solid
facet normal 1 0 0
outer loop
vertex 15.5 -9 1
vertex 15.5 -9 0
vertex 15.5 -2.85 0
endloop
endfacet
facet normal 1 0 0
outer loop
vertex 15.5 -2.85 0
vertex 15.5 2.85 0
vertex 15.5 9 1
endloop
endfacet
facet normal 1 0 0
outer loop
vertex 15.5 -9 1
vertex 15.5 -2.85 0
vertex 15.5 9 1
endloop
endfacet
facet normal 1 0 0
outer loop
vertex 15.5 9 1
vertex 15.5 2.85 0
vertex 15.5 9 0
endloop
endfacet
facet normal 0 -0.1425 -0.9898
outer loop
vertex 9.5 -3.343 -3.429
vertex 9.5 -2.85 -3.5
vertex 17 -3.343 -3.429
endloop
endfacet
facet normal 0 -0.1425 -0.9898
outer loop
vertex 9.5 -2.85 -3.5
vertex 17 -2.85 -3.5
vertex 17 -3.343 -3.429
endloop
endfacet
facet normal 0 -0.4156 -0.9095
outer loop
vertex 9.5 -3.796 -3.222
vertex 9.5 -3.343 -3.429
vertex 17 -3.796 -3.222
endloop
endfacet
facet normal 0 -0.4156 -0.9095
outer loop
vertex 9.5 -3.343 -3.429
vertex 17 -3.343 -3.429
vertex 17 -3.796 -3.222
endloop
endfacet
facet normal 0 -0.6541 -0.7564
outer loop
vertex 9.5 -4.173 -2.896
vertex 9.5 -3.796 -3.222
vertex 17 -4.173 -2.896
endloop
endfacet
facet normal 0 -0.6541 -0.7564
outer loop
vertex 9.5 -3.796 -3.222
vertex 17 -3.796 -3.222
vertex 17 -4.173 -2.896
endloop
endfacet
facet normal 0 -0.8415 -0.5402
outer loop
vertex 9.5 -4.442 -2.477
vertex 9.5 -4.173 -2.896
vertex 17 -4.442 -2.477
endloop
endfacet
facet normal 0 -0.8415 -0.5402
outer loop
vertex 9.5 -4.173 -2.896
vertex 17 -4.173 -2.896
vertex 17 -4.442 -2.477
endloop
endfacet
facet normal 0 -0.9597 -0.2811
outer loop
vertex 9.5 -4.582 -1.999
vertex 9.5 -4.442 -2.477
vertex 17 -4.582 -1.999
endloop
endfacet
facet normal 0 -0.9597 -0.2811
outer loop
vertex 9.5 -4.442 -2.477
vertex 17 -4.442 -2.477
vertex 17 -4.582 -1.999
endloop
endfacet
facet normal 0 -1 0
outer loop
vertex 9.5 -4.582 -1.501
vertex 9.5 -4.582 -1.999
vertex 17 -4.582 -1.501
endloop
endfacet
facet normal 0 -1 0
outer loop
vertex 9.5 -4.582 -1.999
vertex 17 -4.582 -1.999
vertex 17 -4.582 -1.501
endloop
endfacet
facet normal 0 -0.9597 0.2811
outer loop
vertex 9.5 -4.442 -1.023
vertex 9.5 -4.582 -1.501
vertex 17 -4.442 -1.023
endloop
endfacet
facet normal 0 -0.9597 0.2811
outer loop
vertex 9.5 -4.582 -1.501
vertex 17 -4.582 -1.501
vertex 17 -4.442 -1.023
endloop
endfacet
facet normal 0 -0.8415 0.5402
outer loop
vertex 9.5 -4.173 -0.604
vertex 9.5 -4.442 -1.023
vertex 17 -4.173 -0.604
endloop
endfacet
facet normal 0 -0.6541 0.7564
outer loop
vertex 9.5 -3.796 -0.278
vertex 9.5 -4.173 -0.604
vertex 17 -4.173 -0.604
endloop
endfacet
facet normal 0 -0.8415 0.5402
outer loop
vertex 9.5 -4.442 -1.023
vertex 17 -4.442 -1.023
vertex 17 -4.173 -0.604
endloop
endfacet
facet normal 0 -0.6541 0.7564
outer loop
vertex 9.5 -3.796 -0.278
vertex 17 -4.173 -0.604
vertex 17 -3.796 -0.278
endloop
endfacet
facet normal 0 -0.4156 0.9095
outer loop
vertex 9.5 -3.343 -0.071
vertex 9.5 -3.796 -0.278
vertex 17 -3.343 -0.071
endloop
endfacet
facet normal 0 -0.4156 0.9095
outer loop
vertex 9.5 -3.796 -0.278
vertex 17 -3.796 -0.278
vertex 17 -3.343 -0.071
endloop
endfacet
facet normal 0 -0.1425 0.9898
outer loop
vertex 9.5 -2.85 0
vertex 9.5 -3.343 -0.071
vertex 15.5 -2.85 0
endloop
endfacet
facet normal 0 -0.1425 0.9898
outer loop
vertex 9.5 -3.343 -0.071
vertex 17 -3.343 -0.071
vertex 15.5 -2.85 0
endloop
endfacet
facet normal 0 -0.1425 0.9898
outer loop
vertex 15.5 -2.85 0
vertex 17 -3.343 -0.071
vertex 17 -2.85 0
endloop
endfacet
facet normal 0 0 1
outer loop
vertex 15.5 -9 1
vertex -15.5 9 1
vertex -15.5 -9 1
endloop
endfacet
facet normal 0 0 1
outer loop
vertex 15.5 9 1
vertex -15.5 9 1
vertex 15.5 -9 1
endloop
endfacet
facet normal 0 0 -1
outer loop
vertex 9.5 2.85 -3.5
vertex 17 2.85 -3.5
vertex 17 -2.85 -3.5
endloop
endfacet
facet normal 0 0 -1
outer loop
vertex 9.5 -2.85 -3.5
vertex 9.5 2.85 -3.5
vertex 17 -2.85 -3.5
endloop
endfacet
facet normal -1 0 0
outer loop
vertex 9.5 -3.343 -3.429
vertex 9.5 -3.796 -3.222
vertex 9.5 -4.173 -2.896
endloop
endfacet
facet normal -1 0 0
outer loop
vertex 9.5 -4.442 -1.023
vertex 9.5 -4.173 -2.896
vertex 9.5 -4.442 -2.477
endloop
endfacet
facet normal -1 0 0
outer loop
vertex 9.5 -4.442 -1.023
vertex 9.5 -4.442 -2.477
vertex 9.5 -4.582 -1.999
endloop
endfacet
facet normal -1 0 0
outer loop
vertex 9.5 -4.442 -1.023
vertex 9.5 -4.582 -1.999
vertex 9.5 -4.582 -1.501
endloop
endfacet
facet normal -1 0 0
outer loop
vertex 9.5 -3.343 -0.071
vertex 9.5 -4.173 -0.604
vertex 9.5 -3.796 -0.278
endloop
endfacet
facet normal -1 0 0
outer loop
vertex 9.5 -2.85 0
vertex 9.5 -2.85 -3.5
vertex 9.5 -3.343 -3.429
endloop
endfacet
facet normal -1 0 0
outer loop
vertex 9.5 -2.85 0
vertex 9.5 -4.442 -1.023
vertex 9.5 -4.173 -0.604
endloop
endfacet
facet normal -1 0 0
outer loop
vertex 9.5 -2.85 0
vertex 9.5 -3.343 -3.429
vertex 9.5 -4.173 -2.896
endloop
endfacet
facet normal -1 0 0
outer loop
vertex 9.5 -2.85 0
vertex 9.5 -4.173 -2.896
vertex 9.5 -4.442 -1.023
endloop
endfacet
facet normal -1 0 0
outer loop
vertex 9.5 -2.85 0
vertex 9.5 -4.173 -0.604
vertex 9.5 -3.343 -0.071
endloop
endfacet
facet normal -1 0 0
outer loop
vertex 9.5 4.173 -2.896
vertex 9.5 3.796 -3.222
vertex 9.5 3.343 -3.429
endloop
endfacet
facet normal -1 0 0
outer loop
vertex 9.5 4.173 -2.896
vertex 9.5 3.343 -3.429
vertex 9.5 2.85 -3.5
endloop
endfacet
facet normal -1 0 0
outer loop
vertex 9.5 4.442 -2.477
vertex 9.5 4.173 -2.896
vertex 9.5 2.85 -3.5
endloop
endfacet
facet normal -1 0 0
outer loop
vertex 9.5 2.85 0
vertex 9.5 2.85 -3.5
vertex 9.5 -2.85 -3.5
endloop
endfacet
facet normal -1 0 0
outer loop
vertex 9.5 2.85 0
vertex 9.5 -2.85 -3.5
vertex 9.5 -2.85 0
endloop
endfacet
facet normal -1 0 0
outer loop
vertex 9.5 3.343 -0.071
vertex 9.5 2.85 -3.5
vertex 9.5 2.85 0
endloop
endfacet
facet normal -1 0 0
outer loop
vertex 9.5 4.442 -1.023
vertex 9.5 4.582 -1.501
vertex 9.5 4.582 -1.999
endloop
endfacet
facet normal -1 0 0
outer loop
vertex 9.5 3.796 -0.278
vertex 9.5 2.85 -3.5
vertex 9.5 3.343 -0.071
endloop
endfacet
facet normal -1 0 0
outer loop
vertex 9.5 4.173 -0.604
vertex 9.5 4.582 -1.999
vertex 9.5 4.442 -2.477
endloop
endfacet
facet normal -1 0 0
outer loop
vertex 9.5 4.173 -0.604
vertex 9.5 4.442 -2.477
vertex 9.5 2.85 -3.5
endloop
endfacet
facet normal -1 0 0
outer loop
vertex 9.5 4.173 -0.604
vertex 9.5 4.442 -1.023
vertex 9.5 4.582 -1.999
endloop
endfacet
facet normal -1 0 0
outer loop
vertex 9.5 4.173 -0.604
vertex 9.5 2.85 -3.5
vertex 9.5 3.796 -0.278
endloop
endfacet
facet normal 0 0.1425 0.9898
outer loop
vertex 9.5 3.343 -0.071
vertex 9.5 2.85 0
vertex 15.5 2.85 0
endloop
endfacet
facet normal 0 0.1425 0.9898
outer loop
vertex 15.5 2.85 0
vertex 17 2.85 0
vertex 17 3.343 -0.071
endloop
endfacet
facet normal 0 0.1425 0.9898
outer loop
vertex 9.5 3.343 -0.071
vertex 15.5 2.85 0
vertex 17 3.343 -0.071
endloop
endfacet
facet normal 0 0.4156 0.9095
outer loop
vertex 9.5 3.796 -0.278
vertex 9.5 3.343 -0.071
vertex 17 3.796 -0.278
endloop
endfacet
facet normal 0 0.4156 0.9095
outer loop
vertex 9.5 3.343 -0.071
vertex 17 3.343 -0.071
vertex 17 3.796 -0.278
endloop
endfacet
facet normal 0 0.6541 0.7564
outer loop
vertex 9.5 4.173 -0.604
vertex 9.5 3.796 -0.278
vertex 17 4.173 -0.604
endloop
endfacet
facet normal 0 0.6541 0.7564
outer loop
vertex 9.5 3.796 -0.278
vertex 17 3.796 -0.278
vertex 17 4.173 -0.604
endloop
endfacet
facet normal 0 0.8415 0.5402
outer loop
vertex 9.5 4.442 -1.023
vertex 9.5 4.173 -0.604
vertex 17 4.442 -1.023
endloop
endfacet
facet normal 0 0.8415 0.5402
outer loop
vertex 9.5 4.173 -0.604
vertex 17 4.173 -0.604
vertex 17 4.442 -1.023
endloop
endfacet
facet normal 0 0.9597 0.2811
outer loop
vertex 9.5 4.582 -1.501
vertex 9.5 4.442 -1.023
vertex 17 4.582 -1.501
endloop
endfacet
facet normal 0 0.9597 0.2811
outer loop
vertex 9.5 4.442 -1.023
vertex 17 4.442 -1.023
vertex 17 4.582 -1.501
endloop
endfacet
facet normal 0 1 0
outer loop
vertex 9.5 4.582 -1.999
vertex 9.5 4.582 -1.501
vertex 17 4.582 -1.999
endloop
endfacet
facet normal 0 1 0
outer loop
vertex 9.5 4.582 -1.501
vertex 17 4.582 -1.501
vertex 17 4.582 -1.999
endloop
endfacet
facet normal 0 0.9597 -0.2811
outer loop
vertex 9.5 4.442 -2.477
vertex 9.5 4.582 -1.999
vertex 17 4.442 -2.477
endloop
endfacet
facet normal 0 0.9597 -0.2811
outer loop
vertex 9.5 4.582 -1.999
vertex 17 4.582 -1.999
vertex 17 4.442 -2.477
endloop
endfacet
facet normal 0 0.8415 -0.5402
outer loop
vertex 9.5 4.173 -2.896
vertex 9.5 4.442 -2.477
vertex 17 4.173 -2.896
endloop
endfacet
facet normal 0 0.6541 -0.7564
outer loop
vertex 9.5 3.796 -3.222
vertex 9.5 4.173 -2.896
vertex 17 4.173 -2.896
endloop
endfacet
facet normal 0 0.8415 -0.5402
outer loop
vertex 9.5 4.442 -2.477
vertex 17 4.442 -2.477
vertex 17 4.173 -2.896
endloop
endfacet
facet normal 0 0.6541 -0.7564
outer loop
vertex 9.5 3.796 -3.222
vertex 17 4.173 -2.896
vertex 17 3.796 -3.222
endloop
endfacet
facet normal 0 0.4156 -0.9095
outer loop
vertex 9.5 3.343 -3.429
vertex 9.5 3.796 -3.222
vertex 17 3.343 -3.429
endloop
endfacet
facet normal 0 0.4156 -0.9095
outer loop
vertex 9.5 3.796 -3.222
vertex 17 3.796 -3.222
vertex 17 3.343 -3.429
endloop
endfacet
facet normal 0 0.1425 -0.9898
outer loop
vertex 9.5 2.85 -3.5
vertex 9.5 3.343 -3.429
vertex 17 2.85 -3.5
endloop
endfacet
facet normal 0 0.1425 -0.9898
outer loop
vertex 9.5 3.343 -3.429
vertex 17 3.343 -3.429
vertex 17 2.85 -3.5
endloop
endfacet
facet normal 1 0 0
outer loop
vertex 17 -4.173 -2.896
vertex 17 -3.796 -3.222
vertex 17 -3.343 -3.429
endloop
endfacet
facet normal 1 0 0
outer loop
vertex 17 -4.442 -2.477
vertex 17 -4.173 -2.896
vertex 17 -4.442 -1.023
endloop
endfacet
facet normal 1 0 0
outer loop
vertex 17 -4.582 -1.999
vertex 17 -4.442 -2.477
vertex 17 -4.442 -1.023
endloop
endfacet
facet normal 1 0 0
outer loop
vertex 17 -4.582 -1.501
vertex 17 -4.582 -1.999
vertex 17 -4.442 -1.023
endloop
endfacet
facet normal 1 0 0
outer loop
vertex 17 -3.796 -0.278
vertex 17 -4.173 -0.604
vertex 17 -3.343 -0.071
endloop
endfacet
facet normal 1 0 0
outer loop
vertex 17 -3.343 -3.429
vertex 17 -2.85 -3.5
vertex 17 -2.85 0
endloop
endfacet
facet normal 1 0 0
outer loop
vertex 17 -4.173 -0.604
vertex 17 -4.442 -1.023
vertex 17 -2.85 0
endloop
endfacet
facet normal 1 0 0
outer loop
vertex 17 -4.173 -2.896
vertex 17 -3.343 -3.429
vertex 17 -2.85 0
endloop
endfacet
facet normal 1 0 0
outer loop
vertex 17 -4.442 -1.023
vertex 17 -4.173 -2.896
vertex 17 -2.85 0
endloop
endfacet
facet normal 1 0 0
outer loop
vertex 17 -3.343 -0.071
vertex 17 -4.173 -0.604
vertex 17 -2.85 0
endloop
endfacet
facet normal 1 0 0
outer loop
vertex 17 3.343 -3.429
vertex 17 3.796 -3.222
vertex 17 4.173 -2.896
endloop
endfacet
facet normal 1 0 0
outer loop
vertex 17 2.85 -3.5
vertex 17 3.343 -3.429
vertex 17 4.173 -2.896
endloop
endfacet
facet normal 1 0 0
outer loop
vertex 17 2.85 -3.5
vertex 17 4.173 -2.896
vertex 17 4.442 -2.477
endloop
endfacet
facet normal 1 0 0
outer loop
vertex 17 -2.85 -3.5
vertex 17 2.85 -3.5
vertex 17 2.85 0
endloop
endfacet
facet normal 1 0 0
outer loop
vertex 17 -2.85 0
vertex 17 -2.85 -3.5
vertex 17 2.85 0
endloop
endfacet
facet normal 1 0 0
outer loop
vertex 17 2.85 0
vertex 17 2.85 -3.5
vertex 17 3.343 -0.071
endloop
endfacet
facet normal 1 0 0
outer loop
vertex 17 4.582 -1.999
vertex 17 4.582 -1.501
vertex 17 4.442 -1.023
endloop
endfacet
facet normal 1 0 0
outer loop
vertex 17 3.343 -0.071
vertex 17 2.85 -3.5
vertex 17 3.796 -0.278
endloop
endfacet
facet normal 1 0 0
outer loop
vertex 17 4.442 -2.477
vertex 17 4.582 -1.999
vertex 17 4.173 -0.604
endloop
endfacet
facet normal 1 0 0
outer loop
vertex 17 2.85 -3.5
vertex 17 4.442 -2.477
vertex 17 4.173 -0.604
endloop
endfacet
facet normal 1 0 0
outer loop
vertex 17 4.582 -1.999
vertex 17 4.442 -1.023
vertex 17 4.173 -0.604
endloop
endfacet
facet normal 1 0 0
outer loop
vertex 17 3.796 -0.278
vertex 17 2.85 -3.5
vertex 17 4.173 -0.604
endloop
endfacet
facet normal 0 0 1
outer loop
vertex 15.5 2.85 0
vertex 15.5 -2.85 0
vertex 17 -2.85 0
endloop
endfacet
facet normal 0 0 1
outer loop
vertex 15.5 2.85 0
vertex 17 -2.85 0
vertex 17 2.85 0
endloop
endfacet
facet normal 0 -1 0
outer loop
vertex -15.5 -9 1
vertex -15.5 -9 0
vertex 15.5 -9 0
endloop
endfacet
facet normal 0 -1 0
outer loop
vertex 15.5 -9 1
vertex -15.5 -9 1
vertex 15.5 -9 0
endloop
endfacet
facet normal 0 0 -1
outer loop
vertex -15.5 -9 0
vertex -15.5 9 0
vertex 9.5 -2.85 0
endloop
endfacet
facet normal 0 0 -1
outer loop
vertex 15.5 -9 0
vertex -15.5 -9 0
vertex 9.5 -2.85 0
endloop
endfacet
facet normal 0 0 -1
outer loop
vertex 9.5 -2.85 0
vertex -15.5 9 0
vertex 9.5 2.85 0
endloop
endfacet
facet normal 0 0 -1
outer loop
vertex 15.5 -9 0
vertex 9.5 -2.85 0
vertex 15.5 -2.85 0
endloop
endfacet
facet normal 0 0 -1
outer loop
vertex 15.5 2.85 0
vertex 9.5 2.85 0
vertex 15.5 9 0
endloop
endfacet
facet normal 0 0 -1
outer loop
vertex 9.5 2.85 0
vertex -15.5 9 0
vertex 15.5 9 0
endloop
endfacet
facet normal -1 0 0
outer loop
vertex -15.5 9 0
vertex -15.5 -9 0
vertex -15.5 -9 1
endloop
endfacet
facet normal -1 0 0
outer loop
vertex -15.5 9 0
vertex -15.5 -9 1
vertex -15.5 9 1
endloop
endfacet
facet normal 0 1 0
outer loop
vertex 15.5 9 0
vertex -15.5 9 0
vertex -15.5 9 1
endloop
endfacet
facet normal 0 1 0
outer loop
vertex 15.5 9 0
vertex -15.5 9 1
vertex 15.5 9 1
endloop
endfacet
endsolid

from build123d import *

# Parameters (mm, degrees)
ESBO_O1_W                     = 31
ESBO_O1_H                     = 18
RESSALTO_EXTRUS_O1_DEPTH      = 1
RESSALTO_EXTRUS_O2_DEPTH      = 1.5
RESSALTO_EXTRUS_O2_DEPTH_BACK = 6


with BuildPart() as part:
    # Esboço1 → Ressalto-extrusão1 (new body)
    with BuildSketch(Plane.XY):
        Rectangle(ESBO_O1_W, ESBO_O1_H)
    extrude(amount=RESSALTO_EXTRUS_O1_DEPTH)

    # Esboço2 → Ressalto-extrusão2 (add, two sides)
    with BuildSketch(Plane(origin=(15.5, 0, 0), x_dir=(0, 0, -1), z_dir=(1, 0, 0))) as ressalto_extrus_o2_sk:
        with BuildLine():
            Line((3.5, 2.85), (3.5, -2.85))
            ThreePointArc((3.5, -2.85), (1.75, -4.6), (0, -2.85))
            Line((0, -2.85), (0, 2.85))
            ThreePointArc((0, 2.85), (1.75, 4.6), (3.5, 2.85))
        make_face()
    extrude(amount=RESSALTO_EXTRUS_O2_DEPTH)
    extrude(ressalto_extrus_o2_sk.sketch, amount=-RESSALTO_EXTRUS_O2_DEPTH_BACK)


solid = part.part
